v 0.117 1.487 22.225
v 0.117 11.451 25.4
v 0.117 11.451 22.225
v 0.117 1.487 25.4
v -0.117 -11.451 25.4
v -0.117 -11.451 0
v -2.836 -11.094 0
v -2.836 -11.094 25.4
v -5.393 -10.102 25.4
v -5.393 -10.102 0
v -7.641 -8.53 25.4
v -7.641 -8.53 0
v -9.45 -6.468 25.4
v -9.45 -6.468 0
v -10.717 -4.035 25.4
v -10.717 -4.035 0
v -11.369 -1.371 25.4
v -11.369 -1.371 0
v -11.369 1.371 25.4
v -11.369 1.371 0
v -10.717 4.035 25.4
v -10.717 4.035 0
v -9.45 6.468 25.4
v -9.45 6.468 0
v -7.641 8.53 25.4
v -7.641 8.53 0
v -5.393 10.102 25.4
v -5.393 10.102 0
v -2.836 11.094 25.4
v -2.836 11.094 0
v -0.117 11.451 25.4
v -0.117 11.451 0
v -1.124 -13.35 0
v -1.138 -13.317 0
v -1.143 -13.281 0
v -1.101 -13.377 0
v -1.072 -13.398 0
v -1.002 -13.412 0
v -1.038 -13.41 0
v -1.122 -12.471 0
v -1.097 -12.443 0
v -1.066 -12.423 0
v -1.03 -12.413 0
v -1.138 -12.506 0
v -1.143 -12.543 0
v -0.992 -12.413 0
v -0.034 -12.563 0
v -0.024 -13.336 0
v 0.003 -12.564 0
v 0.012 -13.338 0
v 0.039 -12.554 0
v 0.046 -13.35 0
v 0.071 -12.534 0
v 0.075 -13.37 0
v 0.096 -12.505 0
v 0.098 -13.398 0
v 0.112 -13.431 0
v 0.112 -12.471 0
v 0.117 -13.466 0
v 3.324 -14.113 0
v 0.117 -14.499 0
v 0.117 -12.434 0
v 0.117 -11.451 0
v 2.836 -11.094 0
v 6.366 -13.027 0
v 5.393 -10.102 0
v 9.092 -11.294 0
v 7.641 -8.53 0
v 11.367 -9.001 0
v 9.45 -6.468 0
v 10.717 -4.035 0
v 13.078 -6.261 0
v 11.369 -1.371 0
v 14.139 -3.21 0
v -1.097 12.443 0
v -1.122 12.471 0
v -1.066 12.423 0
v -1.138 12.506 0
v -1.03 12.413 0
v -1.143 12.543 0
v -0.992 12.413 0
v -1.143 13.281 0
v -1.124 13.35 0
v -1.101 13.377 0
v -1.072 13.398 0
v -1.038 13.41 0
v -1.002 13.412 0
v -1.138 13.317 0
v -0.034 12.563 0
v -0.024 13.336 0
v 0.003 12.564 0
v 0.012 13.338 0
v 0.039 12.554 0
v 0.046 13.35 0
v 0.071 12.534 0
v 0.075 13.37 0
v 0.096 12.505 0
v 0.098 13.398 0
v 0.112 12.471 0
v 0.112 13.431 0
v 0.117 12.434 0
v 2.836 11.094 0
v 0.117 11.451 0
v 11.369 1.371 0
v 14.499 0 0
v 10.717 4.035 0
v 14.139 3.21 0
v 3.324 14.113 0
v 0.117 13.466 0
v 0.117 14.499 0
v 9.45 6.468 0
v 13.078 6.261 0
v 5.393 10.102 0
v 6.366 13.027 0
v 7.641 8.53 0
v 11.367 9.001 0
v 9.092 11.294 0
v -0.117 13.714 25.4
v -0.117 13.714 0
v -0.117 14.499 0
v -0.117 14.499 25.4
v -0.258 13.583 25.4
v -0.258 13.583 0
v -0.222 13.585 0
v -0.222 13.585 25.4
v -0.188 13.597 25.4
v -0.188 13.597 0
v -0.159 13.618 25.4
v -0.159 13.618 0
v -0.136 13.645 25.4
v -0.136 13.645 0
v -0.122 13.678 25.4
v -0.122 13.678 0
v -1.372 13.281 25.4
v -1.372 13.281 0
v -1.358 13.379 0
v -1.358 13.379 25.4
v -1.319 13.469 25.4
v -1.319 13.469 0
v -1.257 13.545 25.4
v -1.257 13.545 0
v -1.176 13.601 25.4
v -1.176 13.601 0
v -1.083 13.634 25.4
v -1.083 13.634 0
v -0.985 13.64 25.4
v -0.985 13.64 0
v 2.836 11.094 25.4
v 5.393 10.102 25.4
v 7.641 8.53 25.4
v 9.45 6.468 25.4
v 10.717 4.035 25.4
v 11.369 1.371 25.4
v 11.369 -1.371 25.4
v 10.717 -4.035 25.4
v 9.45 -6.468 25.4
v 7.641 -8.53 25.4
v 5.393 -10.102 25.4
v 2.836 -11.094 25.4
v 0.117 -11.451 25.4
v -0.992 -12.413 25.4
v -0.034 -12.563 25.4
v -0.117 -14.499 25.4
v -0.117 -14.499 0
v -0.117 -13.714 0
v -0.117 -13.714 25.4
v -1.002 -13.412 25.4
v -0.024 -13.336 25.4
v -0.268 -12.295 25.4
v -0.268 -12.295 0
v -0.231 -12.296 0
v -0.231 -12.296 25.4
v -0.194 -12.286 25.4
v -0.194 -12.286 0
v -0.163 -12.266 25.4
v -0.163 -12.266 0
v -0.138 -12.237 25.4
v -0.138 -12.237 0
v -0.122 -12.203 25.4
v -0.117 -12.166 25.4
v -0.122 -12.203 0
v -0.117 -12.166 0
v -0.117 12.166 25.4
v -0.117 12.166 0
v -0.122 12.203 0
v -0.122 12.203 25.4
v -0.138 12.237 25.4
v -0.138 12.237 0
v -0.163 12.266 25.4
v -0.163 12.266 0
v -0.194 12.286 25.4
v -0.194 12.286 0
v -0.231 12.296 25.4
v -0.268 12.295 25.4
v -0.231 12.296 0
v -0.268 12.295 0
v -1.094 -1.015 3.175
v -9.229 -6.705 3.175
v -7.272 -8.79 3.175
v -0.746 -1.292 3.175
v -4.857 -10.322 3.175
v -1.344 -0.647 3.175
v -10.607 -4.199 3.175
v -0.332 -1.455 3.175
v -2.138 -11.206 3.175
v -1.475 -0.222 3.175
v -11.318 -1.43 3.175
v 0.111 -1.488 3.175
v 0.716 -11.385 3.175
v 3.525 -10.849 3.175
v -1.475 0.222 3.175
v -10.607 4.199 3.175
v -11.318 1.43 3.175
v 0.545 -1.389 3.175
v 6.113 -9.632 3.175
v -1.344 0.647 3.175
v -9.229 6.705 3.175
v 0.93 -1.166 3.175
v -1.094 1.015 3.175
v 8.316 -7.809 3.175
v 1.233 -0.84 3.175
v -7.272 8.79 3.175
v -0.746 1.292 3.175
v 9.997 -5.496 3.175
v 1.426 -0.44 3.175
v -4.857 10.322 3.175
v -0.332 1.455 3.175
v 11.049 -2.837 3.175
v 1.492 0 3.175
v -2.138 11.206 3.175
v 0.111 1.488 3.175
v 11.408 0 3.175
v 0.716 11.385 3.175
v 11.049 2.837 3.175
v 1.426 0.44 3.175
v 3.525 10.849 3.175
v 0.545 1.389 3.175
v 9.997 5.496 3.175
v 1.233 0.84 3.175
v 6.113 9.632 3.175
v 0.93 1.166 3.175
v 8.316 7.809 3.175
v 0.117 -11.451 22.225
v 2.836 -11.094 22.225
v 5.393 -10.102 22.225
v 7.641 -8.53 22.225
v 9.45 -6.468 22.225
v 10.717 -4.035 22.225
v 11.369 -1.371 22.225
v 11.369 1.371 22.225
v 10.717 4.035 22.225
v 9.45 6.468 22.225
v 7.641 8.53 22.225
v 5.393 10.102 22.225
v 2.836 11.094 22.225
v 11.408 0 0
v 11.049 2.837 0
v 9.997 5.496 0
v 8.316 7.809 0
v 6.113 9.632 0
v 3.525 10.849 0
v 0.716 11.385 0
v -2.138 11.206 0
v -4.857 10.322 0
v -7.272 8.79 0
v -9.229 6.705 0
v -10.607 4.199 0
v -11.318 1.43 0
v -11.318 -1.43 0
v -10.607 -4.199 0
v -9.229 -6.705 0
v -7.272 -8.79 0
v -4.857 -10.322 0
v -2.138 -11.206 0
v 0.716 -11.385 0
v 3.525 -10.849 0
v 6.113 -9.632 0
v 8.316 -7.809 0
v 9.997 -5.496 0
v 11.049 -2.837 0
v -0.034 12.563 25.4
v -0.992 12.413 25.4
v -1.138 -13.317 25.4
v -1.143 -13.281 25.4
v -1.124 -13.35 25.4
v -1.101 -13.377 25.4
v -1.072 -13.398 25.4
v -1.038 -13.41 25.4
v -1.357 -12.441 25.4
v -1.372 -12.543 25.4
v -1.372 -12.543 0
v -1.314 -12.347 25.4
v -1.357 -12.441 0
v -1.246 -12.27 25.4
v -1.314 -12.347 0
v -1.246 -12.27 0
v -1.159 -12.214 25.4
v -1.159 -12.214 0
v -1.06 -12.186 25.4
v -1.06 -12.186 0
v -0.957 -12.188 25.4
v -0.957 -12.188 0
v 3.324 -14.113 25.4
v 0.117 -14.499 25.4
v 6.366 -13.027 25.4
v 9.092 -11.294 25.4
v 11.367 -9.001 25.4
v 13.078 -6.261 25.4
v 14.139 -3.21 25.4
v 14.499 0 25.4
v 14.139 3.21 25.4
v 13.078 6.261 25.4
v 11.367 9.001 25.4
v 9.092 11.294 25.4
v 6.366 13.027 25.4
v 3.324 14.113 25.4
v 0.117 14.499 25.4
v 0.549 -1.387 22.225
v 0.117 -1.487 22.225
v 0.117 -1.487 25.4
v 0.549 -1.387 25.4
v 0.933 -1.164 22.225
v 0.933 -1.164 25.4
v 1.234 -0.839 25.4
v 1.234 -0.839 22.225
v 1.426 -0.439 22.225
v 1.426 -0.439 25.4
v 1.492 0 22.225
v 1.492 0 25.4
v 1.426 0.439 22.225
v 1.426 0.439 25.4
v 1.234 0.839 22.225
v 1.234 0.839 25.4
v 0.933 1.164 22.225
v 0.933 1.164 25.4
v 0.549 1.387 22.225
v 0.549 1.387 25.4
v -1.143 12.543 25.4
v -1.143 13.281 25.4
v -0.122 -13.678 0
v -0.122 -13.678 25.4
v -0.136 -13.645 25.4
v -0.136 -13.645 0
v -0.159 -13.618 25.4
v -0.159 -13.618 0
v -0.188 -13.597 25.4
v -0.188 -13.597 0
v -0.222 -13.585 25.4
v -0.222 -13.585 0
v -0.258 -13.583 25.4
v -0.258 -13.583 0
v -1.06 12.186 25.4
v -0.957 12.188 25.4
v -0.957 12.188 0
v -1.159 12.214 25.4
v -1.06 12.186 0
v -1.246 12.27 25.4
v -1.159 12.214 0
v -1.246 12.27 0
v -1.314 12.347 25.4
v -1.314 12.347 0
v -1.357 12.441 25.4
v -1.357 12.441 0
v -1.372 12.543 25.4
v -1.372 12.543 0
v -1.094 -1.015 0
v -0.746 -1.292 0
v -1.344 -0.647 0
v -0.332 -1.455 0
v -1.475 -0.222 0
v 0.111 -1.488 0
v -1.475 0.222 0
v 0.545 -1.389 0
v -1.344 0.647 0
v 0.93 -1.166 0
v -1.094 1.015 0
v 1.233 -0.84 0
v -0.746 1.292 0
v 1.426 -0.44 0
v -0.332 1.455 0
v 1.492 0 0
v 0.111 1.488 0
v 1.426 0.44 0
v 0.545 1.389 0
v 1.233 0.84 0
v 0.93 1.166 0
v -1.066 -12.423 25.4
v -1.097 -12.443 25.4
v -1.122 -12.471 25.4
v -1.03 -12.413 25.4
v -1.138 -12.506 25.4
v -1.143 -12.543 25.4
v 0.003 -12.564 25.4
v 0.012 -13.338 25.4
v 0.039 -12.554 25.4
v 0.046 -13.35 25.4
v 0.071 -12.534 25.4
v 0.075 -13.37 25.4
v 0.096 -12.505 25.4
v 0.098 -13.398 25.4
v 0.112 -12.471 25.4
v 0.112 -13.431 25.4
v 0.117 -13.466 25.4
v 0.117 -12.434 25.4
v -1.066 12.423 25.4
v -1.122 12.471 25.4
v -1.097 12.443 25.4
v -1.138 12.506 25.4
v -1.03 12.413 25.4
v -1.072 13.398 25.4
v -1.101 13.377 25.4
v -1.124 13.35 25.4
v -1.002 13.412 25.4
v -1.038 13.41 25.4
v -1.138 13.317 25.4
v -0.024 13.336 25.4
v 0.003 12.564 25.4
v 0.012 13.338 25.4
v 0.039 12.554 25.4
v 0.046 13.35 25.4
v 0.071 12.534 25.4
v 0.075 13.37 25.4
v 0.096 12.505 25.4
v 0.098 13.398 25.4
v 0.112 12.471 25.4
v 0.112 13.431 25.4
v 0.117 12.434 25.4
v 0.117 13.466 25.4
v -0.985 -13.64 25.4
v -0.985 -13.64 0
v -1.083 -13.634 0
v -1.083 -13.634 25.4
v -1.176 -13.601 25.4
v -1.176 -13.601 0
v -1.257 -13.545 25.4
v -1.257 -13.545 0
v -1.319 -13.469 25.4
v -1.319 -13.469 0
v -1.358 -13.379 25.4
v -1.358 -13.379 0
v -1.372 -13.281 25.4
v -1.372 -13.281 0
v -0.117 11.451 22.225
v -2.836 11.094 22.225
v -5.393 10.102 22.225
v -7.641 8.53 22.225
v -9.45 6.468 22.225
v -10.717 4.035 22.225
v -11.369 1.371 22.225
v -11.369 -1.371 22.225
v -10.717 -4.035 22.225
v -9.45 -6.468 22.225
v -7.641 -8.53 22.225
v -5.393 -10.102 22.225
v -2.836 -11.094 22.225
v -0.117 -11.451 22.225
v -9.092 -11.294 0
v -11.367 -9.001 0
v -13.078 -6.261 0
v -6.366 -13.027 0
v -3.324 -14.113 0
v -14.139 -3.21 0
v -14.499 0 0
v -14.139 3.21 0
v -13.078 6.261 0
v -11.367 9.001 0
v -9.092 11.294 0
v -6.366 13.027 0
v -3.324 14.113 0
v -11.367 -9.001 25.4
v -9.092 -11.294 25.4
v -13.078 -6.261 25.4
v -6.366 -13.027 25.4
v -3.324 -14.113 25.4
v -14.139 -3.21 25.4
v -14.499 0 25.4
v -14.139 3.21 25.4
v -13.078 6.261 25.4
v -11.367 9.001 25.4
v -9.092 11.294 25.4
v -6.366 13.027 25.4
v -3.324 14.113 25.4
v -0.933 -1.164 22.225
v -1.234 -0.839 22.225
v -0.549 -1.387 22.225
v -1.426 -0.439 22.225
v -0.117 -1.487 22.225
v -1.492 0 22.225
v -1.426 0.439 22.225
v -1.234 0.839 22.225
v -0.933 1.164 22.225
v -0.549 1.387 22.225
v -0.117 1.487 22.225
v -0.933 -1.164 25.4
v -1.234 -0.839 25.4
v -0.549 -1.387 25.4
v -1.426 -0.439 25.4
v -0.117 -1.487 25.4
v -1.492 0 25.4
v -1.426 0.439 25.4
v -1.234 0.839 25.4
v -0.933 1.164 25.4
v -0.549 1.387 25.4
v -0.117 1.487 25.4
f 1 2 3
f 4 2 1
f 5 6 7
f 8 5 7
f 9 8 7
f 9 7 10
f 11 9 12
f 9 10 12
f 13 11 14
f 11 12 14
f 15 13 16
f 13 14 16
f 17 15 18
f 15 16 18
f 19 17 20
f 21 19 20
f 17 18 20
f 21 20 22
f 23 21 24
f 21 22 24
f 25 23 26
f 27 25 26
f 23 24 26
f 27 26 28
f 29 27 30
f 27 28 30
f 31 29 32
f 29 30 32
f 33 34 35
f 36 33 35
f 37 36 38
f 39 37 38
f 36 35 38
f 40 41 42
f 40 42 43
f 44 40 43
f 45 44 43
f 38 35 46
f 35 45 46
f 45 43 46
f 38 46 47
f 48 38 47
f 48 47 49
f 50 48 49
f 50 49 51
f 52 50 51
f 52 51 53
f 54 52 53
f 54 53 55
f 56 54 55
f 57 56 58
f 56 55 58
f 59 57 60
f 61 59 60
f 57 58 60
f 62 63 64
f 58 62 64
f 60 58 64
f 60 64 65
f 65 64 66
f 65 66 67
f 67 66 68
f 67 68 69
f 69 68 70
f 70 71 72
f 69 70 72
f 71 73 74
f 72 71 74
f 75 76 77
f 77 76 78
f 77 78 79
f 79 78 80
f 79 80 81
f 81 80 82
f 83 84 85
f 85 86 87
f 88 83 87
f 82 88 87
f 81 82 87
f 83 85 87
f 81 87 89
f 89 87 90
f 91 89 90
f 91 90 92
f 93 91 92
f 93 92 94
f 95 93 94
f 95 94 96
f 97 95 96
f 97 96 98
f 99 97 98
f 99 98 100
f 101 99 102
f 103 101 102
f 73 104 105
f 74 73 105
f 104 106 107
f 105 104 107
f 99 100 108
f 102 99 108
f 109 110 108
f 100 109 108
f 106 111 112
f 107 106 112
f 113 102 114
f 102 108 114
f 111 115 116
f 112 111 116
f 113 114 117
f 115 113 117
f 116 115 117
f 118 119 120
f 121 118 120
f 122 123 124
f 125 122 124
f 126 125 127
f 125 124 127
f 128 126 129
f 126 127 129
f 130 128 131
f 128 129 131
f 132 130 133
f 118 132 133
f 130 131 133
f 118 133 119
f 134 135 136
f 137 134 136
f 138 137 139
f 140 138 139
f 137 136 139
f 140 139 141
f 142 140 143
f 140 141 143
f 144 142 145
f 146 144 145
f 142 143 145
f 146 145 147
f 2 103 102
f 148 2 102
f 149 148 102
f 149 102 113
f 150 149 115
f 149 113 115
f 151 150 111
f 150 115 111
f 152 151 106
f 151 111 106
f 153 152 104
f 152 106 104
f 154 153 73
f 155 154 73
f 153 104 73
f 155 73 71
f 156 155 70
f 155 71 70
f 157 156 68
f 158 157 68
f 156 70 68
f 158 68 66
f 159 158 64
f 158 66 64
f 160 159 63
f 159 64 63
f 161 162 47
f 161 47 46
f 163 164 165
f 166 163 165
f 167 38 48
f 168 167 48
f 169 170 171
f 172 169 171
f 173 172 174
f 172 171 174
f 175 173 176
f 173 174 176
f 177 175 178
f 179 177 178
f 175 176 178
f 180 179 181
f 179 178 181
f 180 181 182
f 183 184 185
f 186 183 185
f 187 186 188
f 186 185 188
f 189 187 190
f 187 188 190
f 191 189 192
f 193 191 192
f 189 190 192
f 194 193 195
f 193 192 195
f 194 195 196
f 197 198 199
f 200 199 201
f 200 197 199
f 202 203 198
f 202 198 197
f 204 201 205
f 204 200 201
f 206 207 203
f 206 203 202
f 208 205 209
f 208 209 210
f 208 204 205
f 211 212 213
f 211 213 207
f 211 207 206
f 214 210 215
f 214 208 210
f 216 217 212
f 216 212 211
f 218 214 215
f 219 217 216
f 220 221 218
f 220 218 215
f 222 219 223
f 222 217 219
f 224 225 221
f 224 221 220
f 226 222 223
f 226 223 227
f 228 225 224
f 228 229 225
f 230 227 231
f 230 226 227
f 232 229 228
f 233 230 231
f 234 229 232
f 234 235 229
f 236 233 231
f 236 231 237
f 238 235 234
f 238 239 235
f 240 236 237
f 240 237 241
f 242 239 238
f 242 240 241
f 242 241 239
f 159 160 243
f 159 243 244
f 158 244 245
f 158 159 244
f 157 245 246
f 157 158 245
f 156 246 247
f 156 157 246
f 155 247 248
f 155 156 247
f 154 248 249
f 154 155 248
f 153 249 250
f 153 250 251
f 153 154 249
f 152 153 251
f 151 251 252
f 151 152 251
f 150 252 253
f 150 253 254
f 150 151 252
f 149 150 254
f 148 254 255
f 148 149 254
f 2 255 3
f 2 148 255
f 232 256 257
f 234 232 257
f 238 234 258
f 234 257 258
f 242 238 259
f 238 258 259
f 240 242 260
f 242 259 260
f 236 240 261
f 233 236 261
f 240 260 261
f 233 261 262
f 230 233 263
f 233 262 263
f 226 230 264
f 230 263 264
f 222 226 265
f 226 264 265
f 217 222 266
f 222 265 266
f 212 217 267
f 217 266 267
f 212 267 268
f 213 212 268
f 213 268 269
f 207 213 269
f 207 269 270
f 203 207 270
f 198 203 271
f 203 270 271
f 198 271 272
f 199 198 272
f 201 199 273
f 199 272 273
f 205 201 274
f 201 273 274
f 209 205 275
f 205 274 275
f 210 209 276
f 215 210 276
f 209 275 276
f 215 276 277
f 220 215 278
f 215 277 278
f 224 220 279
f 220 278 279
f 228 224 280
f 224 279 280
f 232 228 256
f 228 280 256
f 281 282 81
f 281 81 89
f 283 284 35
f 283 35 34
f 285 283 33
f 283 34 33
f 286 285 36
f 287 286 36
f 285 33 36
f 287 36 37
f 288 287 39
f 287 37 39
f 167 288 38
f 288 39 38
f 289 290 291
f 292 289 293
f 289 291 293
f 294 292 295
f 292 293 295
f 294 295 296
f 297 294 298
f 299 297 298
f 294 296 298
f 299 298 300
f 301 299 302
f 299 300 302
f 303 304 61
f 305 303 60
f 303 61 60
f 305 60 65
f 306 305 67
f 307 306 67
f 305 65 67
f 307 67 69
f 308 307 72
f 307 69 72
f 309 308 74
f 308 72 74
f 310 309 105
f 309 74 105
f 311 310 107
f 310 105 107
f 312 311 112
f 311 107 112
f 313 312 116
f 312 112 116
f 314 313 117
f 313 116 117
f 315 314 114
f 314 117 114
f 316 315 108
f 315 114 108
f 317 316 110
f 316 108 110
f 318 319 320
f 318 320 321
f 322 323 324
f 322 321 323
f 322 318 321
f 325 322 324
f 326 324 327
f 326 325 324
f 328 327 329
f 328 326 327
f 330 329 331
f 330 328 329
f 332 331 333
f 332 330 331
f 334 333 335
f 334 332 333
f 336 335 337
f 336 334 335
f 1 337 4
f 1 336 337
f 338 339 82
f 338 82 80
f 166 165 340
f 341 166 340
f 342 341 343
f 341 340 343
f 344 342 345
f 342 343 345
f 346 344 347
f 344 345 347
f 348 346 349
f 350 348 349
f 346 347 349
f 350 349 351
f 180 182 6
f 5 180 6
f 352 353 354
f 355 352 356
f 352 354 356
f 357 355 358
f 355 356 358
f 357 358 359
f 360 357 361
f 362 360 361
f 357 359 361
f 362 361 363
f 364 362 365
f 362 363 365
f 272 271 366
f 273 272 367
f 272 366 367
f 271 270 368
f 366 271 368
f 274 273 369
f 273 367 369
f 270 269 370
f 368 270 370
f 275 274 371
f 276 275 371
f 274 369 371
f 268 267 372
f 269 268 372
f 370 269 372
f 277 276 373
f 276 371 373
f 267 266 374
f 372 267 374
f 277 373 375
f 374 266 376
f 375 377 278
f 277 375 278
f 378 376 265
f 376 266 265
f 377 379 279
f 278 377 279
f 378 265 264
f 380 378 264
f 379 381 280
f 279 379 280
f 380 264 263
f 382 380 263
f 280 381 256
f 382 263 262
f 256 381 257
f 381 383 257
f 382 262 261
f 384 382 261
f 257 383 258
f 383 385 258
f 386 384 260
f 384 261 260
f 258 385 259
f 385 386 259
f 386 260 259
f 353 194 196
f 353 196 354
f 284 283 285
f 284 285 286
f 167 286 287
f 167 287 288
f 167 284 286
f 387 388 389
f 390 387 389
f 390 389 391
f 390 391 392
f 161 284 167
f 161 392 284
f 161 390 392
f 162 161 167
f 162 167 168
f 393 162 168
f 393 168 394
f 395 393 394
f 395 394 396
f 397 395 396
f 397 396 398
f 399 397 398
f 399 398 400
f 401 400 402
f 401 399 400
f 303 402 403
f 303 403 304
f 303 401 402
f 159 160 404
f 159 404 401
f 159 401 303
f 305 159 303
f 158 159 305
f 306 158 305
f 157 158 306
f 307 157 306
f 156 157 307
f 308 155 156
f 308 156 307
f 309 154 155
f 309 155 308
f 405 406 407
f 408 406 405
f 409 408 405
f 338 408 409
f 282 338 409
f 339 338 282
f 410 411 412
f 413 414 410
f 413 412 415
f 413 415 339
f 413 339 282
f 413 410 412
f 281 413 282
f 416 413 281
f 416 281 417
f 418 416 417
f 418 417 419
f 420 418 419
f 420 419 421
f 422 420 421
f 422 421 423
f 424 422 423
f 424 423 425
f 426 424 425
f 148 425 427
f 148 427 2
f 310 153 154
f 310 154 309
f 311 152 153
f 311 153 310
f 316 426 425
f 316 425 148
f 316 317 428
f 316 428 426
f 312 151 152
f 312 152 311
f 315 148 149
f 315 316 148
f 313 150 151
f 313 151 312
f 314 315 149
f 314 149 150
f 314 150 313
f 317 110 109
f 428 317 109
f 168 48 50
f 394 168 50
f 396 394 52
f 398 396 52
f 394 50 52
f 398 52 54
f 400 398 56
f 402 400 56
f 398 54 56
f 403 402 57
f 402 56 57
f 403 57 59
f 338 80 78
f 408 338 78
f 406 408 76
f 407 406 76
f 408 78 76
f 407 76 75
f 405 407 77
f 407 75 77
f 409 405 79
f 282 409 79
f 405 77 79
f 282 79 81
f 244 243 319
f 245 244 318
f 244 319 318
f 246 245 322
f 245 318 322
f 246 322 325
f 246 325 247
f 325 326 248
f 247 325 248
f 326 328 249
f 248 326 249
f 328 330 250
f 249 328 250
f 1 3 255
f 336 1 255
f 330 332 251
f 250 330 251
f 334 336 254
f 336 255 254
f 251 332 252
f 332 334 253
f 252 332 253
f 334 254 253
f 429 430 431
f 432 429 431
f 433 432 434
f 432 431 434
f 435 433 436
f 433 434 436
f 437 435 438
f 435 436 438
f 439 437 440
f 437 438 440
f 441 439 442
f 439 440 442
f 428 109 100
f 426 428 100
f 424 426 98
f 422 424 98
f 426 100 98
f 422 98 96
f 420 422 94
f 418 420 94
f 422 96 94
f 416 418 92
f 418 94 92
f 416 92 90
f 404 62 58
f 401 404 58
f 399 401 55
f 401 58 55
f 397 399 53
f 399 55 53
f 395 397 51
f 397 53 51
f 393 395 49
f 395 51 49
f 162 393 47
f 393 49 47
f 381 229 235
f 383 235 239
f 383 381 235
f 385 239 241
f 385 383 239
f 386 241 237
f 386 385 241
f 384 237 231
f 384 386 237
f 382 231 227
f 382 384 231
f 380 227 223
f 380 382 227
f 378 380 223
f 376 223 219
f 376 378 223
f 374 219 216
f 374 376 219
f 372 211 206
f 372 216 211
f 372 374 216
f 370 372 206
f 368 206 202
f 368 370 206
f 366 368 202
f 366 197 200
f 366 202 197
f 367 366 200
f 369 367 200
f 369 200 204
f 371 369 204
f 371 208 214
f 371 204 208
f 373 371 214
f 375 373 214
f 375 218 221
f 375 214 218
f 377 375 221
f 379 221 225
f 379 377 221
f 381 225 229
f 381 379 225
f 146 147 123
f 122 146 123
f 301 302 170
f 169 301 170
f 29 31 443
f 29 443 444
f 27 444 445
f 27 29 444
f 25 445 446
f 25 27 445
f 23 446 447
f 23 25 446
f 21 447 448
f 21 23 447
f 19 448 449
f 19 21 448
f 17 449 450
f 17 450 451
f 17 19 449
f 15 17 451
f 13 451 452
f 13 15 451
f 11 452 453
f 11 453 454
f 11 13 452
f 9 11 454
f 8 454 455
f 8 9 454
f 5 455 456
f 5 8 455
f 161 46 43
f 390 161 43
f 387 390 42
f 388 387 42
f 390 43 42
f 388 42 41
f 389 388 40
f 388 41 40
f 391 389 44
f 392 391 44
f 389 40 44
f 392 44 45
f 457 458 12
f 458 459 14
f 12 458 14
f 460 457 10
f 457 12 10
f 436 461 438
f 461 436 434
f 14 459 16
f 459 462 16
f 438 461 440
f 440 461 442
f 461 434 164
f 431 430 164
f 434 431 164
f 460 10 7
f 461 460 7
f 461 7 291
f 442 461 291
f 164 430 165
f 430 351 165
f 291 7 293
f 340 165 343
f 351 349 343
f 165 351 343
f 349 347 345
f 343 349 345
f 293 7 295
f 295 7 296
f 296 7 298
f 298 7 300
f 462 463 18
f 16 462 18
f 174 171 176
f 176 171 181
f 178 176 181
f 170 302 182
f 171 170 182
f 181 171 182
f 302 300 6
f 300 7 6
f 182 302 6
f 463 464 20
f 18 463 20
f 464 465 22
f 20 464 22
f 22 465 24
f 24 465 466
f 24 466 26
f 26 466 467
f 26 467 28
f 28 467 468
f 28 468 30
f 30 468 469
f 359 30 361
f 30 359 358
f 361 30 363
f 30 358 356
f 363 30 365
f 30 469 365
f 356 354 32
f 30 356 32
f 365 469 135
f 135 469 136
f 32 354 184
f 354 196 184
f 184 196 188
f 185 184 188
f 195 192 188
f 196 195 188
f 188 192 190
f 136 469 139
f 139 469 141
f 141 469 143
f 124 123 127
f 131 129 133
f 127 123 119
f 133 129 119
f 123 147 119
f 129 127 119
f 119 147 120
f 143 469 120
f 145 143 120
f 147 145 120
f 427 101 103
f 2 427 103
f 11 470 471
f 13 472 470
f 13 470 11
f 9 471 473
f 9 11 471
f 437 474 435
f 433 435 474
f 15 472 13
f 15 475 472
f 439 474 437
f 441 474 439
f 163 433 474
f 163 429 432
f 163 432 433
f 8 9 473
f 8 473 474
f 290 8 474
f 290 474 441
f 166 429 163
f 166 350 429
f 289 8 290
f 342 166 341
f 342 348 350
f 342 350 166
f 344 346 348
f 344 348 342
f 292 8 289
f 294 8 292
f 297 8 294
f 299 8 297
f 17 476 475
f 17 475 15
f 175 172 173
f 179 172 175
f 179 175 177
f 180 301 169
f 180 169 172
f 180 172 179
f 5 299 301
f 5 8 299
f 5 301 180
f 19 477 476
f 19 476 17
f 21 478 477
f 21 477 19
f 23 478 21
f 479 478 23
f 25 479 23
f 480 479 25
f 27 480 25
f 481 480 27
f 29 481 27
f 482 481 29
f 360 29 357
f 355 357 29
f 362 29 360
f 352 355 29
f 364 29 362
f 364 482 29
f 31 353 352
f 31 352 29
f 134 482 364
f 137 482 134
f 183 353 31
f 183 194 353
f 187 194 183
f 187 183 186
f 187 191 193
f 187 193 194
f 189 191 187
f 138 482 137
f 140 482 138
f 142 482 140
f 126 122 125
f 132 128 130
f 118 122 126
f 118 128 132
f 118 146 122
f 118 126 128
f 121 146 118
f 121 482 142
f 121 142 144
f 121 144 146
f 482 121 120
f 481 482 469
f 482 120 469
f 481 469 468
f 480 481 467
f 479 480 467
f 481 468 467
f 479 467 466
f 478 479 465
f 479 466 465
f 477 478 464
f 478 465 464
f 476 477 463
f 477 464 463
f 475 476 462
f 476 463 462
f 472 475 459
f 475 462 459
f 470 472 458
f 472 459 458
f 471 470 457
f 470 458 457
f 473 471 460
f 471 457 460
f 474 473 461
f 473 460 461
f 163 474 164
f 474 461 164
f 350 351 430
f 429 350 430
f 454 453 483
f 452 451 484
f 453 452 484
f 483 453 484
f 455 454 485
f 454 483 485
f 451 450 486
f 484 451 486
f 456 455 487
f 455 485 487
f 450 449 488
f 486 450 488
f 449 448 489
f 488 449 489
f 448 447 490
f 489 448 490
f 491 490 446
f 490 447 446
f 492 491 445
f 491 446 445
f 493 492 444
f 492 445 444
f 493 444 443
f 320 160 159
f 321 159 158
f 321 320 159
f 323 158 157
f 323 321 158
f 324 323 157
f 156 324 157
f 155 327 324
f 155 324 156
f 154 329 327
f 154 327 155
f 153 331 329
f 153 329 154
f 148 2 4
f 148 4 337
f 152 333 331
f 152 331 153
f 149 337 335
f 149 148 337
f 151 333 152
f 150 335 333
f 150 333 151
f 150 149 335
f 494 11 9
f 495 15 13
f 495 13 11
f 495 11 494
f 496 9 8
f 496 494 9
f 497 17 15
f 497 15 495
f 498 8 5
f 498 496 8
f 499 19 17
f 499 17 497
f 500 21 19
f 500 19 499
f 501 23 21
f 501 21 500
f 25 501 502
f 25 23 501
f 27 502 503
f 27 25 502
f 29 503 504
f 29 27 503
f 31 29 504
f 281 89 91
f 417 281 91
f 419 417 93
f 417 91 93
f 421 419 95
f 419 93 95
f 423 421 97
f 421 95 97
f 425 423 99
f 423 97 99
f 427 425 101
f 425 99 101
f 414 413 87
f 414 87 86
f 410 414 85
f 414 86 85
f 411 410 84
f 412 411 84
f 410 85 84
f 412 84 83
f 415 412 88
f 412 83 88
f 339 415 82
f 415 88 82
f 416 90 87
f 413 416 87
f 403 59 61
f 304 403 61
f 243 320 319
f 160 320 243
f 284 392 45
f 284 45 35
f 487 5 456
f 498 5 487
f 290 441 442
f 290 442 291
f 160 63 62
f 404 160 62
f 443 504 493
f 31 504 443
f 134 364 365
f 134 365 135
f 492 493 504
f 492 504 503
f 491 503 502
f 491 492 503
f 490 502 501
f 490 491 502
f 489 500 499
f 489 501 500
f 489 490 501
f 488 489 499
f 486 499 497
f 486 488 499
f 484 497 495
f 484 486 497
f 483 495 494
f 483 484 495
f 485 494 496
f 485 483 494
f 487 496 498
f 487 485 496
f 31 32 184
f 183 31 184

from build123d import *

# Parameters (mm, degrees)
F1_DEPTH       = 25.4
F2_DEPTH       = 25.4
F3_R           = 11.4077093499
F4_DEPTH       = 3.175
F7_DEPTH       = 3.175
F9_DEPTH       = 3.175
F8_R           = 1.4919670492
F10_DEPTH      = 10.414
F10_DEPTH_BACK = 34.544


with BuildPart() as f1:
    # F0 (on Top) → F1 (new body)
    with BuildSketch(Plane.XY):
        with BuildLine():
            Line((-0.1169041469, 13.713780639), (-0.1169041469, 14.4988111578))
            ThreePointArc((-0.1169041469, 14.4988111578), (-14.4992824501, 0), (-0.1169041469, -14.4988111578))
            Line((-0.1169041469, -14.4988111578), (-0.1169041469, -13.713780639))
            ThreePointArc((-0.1169041469, -13.713780639), (-0.1588861156, -13.6177219618), (-0.2579005322, -13.5832850558))
            Line((-0.2579005322, -13.5832850558), (-0.9845611309, -13.6395810228))
            ThreePointArc((-0.9845611309, -13.6395810228), (-1.2565093233, -13.5449982877), (-1.3718149617, -13.2811681855))
            Line((-1.3718149617, -13.2811681855), (-1.3718149617, -12.5426644034))
            ThreePointArc((-1.3718149617, -12.5426644034), (-1.2460316386, -12.2695097811), (-0.9567040601, -12.187507072))
            Line((-0.9567040601, -12.187507072), (-0.268043095, -12.2953638856))
            ThreePointArc((-0.268043095, -12.2953638856), (-0.1627009666, -12.2655072783), (-0.1169041469, -12.1660536091))
            Line((-0.1169041469, -12.1660536091), (-0.1169041469, -11.4506855051))
            ThreePointArc((-0.1169041469, -11.4506855051), (-11.4512822477, 0), (-0.1169041469, 11.4506855051))
            Line((-0.1169041469, 11.4506855051), (-0.1169041469, 12.1660536091))
            ThreePointArc((-0.1169041469, 12.1660536091), (-0.1627009666, 12.2655072783), (-0.268043095, 12.2953638856))
            Line((-0.268043095, 12.2953638856), (-0.9567040601, 12.187507072))
            ThreePointArc((-0.9567040601, 12.187507072), (-1.2460316386, 12.2695097811), (-1.3718149617, 12.5426644034))
            Line((-1.3718149617, 12.5426644034), (-1.3718149617, 13.2811681855))
            ThreePointArc((-1.3718149617, 13.2811681855), (-1.2565093233, 13.5449982877), (-0.9845611309, 13.6395810228))
            Line((-0.9845611309, 13.6395810228), (-0.2579005322, 13.5832850558))
            ThreePointArc((-0.2579005322, 13.5832850558), (-0.1588861156, 13.6177219618), (-0.1169041469, 13.713780639))
        make_face()
    extrude(amount=F1_DEPTH)


with BuildPart() as f2:
    # F0 (on Top) → F2 (new body)
    with BuildSketch(Plane.XY):
        with BuildLine():
            ThreePointArc((0.1169041469, 11.4506855051), (11.4512822477, 0), (0.1169041469, -11.4506855051))
            Line((0.1169041469, -11.4506855051), (0.1169041469, -12.4340591473))
            ThreePointArc((0.1169041469, -12.4340591473), (0.0711073271, -12.5335128165), (-0.0342348012, -12.5633694238))
            Line((-0.0342348012, -12.5633694238), (-0.9920758104, -12.4133541269))
            ThreePointArc((-0.9920758104, -12.4133541269), (-1.0974179387, -12.4432107342), (-1.1432147585, -12.5426644034))
            Line((-1.1432147585, -12.5426644034), (-1.1432147585, -13.2811681855))
            ThreePointArc((-1.1432147585, -13.2811681855), (-1.1012327897, -13.3772268628), (-1.0022183732, -13.4116637687))
            Line((-1.0022183732, -13.4116637687), (-0.0240922384, -13.3358862232))
            ThreePointArc((-0.0240922384, -13.3358862232), (0.0749221781, -13.3703231292), (0.1169041469, -13.4663818064))
            Line((0.1169041469, -13.4663818064), (0.1169041469, -14.4988111578))
            ThreePointArc((0.1169041469, -14.4988111578), (14.4992824501, 0), (0.1169041469, 14.4988111578))
            Line((0.1169041469, 14.4988111578), (0.1169041469, 13.4663818064))
            ThreePointArc((0.1169041469, 13.4663818064), (0.0749221781, 13.3703231292), (-0.0240922384, 13.3358862232))
            Line((-0.0240922384, 13.3358862232), (-1.0022183732, 13.4116637687))
            ThreePointArc((-1.0022183732, 13.4116637687), (-1.1012327897, 13.3772268628), (-1.1432147585, 13.2811681855))
            Line((-1.1432147585, 13.2811681855), (-1.1432147585, 12.5426644034))
            ThreePointArc((-1.1432147585, 12.5426644034), (-1.0974179387, 12.4432107342), (-0.9920758104, 12.4133541269))
            Line((-0.9920758104, 12.4133541269), (-0.0342348012, 12.5633694238))
            ThreePointArc((-0.0342348012, 12.5633694238), (0.0711073271, 12.5335128165), (0.1169041469, 12.4340591473))
            Line((0.1169041469, 12.4340591473), (0.1169041469, 11.4506855051))
        make_face()
    extrude(amount=F2_DEPTH)


with BuildPart() as f4:
    # F3 (on Top) → F4 (new body)
    with BuildSketch(Plane.XY):
        Circle(F3_R)
    extrude(amount=F4_DEPTH)

    # F3 (on Top) → F9 (join)
    with BuildSketch(Plane.XY):
        Circle(F3_R)
    extrude(amount=F9_DEPTH)


with BuildPart() as f7:
    # F6 (on offset) → F7 (new body)
    with BuildSketch(Plane.XY.offset(25.4)):
        with BuildLine():
            ThreePointArc((-0.1169041469, 11.4506855051), (-11.4512822477, 0), (-0.1169041469, -11.4506855051))
            Line((-0.1169041469, -11.4506855051), (-0.1169041469, 11.4506855051))
        make_face()
    extrude(amount=-F7_DEPTH)


with BuildPart() as f7b:
    # F6 (on offset) → F7, piece 2 (new body)
    with BuildSketch(Plane.XY.offset(25.4)):
        with BuildLine():
            Line((0.1169041469, 11.4506855051), (0.1169041469, -11.4506855051))
            ThreePointArc((0.1169041469, -11.4506855051), (11.4512822477, 0), (0.1169041469, 11.4506855051))
        make_face()
    extrude(amount=-F7_DEPTH)


with BuildPart() as f10_tool:
    # F8 (on Top) → F10 (new body, two sides)
    with BuildSketch(Plane.XY) as f10_sk:
        Circle(F8_R)
    extrude(amount=-F10_DEPTH)
    extrude(f10_sk.sketch, amount=F10_DEPTH_BACK)


with BuildPart() as f4_1:
    add(f4.part)

    # F10: cut by f10_tool
    add(f10_tool.part, mode=Mode.SUBTRACT)


with BuildPart() as f7_1:
    add(f7.part)

    # F10: cut by f10_tool
    add(f10_tool.part, mode=Mode.SUBTRACT)


with BuildPart() as f7b_1:
    add(f7b.part)

    # F10: cut by f10_tool
    add(f10_tool.part, mode=Mode.SUBTRACT)


solid = Compound([f1.part, f2.part, f4_1.part, f7_1.part, f7b_1.part])
